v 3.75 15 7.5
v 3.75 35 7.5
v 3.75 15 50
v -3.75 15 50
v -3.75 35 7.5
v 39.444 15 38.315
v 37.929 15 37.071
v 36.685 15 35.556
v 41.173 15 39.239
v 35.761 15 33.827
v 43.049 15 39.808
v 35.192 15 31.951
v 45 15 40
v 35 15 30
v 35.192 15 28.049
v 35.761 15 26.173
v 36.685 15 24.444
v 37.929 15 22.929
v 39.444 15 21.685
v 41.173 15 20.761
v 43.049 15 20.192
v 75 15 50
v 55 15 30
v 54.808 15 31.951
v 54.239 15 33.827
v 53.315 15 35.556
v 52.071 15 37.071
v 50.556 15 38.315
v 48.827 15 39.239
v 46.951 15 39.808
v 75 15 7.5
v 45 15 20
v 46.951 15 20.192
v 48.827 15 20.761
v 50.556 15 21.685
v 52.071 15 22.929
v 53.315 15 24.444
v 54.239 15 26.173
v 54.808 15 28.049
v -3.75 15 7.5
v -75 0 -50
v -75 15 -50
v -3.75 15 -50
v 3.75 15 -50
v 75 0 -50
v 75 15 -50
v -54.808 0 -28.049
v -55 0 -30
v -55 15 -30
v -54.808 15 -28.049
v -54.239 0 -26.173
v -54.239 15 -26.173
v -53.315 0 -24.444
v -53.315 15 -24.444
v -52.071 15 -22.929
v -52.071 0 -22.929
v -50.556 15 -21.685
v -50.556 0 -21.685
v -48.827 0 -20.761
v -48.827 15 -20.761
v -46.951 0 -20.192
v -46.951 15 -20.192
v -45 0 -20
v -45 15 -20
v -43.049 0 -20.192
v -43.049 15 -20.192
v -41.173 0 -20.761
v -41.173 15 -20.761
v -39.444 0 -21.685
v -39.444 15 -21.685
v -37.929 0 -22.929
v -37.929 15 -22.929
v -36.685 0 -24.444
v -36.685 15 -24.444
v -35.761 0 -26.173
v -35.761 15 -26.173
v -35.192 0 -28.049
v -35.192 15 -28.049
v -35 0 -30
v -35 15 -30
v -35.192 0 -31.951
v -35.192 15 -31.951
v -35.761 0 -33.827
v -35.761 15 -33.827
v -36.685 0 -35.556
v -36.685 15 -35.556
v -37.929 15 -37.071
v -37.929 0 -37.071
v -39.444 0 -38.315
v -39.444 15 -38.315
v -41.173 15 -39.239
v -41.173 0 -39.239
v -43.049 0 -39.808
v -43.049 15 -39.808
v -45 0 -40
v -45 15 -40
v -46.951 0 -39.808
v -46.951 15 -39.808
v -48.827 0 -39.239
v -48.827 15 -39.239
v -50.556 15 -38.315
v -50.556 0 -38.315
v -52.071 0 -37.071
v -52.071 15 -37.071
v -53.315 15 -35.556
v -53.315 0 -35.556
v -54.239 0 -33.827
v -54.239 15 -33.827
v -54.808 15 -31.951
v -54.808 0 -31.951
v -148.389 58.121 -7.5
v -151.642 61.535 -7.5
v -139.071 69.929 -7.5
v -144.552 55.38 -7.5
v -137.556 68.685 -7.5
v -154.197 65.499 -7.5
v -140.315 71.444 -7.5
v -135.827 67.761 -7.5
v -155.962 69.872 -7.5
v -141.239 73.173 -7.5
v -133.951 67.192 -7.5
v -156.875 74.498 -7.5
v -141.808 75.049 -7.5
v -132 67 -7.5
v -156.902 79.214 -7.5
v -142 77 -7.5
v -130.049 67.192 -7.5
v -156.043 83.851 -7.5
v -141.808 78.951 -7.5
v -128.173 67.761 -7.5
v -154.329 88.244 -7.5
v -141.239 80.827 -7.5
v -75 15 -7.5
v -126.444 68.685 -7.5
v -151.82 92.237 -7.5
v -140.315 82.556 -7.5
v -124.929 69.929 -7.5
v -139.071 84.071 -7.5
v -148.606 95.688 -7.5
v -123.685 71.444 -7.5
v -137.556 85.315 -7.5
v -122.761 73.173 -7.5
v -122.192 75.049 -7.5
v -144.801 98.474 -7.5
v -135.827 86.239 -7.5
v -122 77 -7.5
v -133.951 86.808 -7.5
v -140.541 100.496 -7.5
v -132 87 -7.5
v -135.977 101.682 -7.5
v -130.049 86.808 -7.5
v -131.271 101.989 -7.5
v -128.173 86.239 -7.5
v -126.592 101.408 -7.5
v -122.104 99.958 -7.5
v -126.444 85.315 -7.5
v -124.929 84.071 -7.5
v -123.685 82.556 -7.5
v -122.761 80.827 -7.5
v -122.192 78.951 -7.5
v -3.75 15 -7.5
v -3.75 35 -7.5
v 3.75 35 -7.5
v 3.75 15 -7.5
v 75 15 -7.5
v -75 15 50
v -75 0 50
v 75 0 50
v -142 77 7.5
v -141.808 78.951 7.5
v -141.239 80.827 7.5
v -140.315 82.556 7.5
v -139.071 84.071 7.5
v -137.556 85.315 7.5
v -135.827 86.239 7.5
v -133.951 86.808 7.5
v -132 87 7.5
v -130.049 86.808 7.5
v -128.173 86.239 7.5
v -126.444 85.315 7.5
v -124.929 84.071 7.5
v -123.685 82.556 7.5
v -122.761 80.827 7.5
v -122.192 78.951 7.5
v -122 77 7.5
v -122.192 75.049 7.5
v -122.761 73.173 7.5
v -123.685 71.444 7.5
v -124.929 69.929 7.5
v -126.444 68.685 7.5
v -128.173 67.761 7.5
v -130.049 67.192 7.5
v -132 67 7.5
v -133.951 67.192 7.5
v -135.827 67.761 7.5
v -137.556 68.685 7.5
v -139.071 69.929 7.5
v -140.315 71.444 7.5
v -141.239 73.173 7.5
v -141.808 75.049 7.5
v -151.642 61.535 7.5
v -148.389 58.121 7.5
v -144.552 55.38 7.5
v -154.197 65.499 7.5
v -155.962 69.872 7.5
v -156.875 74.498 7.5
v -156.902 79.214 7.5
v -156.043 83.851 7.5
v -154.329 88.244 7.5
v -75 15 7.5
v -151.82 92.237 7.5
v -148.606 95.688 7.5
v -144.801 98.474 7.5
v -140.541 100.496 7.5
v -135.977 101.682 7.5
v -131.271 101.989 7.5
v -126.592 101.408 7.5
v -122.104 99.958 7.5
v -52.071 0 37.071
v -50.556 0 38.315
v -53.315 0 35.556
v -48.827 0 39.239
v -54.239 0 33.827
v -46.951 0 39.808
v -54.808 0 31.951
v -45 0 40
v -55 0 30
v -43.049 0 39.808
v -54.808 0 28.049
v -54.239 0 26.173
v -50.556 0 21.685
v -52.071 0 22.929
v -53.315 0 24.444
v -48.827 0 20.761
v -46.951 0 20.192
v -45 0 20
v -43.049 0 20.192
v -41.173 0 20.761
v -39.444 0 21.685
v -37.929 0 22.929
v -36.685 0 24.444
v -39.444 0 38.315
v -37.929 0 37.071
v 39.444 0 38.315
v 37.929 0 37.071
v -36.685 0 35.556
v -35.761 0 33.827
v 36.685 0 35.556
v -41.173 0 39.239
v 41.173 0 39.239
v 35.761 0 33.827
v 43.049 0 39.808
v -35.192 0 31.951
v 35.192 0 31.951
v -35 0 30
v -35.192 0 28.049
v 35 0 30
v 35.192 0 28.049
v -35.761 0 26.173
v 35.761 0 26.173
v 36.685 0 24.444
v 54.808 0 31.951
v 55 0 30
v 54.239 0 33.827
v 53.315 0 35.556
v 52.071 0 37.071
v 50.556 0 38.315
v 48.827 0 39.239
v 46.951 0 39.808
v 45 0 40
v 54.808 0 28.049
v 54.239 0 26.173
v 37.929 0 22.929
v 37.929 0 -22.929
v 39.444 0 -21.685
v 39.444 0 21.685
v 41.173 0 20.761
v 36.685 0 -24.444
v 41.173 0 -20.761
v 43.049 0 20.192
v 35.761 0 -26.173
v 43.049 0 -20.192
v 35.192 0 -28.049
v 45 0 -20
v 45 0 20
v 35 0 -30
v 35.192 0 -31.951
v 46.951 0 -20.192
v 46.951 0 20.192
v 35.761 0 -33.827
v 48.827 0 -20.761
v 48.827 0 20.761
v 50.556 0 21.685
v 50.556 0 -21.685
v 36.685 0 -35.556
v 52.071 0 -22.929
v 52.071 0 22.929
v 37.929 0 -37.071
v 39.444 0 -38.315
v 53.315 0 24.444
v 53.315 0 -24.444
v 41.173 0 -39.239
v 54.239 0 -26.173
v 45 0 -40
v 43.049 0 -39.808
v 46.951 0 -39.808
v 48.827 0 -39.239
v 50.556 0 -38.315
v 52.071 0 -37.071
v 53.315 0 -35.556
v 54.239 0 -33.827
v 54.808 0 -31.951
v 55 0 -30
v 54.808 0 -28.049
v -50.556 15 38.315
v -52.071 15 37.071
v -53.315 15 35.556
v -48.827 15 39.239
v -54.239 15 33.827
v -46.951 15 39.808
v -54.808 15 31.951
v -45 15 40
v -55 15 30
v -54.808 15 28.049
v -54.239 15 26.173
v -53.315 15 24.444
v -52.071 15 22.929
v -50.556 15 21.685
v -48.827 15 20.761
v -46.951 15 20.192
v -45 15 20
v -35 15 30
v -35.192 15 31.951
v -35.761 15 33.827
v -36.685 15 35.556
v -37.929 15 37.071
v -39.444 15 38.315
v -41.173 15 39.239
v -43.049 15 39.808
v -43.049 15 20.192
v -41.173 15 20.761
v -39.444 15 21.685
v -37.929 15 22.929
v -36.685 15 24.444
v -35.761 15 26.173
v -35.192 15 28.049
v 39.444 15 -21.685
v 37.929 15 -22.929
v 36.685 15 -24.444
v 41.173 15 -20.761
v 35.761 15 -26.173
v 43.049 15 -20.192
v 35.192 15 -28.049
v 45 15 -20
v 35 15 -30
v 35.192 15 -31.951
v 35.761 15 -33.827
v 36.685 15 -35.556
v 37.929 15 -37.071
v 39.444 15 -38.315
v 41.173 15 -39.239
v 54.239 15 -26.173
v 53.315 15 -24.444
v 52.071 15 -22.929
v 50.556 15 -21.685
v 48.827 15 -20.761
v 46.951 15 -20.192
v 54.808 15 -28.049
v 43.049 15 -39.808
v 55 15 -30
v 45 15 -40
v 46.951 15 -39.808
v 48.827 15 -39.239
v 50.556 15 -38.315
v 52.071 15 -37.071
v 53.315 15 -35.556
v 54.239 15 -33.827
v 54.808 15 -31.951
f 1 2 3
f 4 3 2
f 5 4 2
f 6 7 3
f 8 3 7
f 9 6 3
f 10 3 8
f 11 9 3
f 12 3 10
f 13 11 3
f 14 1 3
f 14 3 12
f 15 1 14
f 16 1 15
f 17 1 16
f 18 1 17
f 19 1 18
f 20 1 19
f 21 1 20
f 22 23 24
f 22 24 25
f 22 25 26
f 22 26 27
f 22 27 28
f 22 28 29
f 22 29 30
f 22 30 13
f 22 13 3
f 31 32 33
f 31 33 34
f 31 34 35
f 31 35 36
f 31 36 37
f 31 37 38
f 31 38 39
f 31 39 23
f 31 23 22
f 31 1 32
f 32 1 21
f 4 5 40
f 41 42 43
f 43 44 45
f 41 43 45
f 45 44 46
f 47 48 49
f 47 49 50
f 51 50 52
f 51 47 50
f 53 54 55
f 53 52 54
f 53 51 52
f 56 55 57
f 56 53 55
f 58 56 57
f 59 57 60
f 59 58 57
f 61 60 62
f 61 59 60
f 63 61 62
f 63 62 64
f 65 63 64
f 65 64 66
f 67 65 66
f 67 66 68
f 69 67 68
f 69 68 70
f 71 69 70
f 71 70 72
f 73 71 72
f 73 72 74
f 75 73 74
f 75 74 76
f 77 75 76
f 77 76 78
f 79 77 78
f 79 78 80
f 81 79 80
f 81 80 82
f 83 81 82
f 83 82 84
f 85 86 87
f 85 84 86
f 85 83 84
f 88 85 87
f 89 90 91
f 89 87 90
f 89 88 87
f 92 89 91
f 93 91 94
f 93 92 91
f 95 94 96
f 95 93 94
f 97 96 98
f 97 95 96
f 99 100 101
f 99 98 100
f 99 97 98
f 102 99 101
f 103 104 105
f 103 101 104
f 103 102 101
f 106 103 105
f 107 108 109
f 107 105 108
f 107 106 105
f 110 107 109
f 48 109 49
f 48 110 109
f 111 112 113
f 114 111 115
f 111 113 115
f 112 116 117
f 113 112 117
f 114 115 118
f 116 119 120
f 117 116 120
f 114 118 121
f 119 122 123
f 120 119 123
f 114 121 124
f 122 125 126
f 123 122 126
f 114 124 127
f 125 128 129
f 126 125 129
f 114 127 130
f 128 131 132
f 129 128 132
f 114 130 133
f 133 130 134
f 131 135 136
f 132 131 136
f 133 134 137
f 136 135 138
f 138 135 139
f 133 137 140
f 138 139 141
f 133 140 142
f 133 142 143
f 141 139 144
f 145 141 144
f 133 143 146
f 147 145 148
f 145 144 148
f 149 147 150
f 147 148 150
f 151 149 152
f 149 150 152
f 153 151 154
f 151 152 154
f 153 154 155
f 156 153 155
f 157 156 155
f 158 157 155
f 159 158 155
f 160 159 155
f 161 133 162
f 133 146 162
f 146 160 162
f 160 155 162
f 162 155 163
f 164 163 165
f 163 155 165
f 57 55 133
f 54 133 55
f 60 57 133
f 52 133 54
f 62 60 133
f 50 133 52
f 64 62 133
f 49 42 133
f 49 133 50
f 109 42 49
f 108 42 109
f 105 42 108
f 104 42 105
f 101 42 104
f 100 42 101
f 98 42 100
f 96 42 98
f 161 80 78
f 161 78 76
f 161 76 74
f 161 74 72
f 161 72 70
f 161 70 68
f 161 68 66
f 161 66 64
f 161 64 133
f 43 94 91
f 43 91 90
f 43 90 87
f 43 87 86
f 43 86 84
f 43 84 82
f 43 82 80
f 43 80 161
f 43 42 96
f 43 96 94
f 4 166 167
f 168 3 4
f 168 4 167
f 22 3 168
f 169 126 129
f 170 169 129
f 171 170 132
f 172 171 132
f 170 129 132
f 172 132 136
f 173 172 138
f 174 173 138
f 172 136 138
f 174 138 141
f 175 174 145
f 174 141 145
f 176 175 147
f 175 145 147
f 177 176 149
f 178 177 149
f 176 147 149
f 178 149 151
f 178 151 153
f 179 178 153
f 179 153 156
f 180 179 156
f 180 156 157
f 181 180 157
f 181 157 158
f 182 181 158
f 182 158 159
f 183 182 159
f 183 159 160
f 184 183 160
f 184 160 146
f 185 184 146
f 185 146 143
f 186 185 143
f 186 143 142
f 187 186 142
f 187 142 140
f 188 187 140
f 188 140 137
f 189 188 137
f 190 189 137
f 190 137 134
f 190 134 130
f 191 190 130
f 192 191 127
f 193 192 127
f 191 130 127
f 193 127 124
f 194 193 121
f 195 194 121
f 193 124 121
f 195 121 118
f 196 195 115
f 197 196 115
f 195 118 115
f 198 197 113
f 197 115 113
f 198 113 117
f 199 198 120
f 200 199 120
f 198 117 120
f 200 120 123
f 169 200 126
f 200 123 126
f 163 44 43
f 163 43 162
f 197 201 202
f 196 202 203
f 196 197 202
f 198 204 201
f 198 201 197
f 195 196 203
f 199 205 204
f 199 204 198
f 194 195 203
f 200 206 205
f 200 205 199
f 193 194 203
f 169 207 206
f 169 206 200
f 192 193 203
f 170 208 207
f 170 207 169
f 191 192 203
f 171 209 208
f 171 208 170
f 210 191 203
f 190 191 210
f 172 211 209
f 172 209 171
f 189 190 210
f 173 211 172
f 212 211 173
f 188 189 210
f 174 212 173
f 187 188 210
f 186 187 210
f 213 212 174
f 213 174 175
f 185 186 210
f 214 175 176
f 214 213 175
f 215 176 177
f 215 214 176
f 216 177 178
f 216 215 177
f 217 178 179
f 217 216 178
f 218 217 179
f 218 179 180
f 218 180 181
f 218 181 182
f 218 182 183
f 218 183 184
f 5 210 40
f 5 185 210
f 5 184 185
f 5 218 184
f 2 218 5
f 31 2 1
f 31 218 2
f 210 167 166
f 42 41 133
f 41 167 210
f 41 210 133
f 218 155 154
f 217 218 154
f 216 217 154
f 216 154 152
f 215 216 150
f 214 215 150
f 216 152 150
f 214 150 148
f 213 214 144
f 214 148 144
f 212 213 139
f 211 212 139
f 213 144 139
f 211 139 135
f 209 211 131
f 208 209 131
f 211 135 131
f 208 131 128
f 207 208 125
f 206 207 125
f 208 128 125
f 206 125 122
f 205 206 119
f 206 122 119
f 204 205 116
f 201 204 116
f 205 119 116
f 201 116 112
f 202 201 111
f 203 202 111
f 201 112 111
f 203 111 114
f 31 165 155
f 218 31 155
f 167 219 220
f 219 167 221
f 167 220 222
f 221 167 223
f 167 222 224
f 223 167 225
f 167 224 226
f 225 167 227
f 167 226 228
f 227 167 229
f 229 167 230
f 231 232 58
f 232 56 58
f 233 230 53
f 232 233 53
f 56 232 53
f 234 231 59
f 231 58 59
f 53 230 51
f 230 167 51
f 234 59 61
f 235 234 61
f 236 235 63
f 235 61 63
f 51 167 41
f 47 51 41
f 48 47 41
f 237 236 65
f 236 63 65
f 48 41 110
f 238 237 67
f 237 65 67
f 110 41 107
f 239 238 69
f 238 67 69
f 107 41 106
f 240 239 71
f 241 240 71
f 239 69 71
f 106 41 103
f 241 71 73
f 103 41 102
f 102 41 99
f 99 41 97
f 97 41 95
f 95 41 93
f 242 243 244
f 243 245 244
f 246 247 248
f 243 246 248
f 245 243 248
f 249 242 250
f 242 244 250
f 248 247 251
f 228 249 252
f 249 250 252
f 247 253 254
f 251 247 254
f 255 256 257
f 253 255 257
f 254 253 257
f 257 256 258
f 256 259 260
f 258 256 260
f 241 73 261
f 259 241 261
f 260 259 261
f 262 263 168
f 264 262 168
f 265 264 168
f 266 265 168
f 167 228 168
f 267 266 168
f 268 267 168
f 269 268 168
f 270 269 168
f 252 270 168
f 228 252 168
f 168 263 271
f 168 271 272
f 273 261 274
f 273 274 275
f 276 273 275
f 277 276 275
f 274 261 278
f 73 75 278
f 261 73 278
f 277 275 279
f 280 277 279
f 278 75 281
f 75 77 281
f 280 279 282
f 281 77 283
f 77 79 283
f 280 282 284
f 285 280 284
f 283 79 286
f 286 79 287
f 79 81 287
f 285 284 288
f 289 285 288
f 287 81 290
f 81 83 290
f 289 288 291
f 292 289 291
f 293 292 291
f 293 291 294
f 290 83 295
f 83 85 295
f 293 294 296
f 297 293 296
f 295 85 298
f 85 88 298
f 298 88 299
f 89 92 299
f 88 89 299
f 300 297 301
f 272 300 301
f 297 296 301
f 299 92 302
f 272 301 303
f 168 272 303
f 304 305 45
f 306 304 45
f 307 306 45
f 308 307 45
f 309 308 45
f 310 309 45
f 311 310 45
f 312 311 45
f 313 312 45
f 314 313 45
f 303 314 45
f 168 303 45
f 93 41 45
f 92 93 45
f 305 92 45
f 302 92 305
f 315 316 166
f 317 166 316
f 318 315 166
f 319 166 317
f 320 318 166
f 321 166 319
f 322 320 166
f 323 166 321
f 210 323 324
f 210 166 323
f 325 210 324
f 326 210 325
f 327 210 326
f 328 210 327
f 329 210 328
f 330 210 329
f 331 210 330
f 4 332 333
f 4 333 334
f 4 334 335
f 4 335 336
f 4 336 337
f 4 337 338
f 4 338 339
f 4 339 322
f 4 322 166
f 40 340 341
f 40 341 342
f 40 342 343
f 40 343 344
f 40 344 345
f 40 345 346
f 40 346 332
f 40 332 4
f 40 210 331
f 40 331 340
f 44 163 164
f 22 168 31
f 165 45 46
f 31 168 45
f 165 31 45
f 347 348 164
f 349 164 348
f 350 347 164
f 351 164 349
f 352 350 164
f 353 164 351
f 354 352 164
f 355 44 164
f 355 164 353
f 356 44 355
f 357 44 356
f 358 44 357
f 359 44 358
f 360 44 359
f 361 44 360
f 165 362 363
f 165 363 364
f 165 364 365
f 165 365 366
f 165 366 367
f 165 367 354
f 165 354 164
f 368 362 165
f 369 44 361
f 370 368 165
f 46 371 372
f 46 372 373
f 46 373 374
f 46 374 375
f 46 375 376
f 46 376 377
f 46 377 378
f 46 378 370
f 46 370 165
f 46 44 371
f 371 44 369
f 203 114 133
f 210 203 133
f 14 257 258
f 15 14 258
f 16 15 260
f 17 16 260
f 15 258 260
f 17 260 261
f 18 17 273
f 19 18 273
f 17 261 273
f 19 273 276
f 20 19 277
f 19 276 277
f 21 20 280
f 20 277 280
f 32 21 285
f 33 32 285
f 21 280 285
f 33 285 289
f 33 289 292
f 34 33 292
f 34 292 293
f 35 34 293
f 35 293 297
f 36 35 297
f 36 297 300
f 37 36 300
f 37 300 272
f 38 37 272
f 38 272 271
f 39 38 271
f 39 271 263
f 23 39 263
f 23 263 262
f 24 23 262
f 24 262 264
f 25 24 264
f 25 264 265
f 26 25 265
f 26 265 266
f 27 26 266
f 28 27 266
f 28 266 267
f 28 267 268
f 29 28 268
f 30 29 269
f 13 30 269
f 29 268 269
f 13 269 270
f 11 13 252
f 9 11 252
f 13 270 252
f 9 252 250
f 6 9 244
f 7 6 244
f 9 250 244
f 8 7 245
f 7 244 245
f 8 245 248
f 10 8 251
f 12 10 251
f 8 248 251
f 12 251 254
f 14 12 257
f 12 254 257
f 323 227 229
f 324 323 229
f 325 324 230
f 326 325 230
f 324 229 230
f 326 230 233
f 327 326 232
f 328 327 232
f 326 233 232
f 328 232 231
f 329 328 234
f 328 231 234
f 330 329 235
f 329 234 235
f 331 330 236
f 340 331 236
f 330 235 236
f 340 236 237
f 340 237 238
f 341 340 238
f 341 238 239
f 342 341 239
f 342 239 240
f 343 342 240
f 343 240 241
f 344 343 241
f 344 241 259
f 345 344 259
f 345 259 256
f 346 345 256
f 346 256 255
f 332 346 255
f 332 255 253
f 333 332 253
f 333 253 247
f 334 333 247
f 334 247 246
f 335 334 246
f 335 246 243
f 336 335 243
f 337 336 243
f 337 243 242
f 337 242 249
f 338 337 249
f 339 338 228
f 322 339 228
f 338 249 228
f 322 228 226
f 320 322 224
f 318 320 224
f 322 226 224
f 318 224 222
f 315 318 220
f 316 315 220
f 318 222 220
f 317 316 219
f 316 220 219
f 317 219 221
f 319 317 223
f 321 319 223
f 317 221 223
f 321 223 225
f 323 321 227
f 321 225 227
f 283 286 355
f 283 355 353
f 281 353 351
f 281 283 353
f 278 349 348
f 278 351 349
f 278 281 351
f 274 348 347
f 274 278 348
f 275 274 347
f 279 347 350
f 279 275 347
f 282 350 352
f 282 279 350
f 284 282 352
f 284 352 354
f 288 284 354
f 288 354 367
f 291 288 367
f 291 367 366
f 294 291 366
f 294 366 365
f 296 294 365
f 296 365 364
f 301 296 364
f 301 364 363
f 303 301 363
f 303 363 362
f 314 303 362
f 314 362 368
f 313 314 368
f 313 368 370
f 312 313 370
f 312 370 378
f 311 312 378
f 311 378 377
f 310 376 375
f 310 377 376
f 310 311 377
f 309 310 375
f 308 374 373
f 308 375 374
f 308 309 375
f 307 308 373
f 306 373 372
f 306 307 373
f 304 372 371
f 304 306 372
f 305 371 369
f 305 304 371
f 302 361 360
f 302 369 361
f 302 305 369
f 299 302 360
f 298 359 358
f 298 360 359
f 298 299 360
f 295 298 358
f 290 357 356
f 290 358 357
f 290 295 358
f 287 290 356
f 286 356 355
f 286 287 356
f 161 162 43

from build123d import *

# Parameters (mm, degrees)
BOSS_EXTRUDE1_DEPTH      = 50
BOSS_EXTRUDE1_DEPTH_BACK = 50
SKETCH1_W                = 150
SKETCH1_H                = 15
BOSS_EXTRUDE2_DEPTH      = 7.5
BOSS_EXTRUDE2_DEPTH_BACK = 7.5
HOLE1_D                  = 20
BOSS_EXTRUDE3_DEPTH      = 3.75
HOLE2_D                  = 20


with BuildPart() as part:
    # Sketch1 → Boss-Extrude1 (new, two sides: drawn at the far end of the back side and taken through both)
    with BuildSketch(Plane.XY.offset(-BOSS_EXTRUDE1_DEPTH_BACK)):
        with Locations((0, 7.5)):
            Rectangle(SKETCH1_W, SKETCH1_H)
    extrude(amount=BOSS_EXTRUDE1_DEPTH + BOSS_EXTRUDE1_DEPTH_BACK)

    # Sketch2 → Boss-Extrude2 (add, two sides: drawn at the far end of the back side and taken through both)
    with BuildSketch(Plane.XY.offset(-BOSS_EXTRUDE2_DEPTH_BACK)):
        with BuildLine():
            Line((75, 15), (-122.10432852, 99.958128973))
            ThreePointArc((-122.10432852, 99.958128973), (-154.328840447, 88.243793145), (-144.552094943, 55.379525617))
            Line((-144.552094943, 55.379525617), (-75, 15))
            Line((-75, 15), (75, 15))
        make_face()
    extrude(amount=BOSS_EXTRUDE2_DEPTH + BOSS_EXTRUDE2_DEPTH_BACK)

    # Hole1 (through all)
    with Locations(Plane.XY.offset(7.5)):
        with Locations((-132, 77)):
            Hole(HOLE1_D / 2)

    # Sketch5 → Boss-Extrude3 (add, symmetric)
    with BuildSketch(Plane(origin=(0, 0, 0), x_dir=(0, 0, -1), z_dir=(1, 0, 0))):
        Polygon((-50, 15), (-7.5, 35), (-7.5, 15), align=None)
    boss_extrude3 = extrude(amount=BOSS_EXTRUDE3_DEPTH, both=True)

    # Mirror1: Boss-Extrude3 across plane
    add(boss_extrude3.mirror(Plane.XY))

    # Hole2 (through all)
    with Locations(Plane(origin=(0, 15, 0), x_dir=(1, 0, 0), z_dir=(0, 1, 0))):
        with Locations((45, -30), (-45, -30)):
            hole2 = Hole(HOLE2_D / 2)

    # Mirror2: Hole2 across plane
    add(hole2.mirror(Plane.XY), mode=Mode.SUBTRACT)


solid = part.part
